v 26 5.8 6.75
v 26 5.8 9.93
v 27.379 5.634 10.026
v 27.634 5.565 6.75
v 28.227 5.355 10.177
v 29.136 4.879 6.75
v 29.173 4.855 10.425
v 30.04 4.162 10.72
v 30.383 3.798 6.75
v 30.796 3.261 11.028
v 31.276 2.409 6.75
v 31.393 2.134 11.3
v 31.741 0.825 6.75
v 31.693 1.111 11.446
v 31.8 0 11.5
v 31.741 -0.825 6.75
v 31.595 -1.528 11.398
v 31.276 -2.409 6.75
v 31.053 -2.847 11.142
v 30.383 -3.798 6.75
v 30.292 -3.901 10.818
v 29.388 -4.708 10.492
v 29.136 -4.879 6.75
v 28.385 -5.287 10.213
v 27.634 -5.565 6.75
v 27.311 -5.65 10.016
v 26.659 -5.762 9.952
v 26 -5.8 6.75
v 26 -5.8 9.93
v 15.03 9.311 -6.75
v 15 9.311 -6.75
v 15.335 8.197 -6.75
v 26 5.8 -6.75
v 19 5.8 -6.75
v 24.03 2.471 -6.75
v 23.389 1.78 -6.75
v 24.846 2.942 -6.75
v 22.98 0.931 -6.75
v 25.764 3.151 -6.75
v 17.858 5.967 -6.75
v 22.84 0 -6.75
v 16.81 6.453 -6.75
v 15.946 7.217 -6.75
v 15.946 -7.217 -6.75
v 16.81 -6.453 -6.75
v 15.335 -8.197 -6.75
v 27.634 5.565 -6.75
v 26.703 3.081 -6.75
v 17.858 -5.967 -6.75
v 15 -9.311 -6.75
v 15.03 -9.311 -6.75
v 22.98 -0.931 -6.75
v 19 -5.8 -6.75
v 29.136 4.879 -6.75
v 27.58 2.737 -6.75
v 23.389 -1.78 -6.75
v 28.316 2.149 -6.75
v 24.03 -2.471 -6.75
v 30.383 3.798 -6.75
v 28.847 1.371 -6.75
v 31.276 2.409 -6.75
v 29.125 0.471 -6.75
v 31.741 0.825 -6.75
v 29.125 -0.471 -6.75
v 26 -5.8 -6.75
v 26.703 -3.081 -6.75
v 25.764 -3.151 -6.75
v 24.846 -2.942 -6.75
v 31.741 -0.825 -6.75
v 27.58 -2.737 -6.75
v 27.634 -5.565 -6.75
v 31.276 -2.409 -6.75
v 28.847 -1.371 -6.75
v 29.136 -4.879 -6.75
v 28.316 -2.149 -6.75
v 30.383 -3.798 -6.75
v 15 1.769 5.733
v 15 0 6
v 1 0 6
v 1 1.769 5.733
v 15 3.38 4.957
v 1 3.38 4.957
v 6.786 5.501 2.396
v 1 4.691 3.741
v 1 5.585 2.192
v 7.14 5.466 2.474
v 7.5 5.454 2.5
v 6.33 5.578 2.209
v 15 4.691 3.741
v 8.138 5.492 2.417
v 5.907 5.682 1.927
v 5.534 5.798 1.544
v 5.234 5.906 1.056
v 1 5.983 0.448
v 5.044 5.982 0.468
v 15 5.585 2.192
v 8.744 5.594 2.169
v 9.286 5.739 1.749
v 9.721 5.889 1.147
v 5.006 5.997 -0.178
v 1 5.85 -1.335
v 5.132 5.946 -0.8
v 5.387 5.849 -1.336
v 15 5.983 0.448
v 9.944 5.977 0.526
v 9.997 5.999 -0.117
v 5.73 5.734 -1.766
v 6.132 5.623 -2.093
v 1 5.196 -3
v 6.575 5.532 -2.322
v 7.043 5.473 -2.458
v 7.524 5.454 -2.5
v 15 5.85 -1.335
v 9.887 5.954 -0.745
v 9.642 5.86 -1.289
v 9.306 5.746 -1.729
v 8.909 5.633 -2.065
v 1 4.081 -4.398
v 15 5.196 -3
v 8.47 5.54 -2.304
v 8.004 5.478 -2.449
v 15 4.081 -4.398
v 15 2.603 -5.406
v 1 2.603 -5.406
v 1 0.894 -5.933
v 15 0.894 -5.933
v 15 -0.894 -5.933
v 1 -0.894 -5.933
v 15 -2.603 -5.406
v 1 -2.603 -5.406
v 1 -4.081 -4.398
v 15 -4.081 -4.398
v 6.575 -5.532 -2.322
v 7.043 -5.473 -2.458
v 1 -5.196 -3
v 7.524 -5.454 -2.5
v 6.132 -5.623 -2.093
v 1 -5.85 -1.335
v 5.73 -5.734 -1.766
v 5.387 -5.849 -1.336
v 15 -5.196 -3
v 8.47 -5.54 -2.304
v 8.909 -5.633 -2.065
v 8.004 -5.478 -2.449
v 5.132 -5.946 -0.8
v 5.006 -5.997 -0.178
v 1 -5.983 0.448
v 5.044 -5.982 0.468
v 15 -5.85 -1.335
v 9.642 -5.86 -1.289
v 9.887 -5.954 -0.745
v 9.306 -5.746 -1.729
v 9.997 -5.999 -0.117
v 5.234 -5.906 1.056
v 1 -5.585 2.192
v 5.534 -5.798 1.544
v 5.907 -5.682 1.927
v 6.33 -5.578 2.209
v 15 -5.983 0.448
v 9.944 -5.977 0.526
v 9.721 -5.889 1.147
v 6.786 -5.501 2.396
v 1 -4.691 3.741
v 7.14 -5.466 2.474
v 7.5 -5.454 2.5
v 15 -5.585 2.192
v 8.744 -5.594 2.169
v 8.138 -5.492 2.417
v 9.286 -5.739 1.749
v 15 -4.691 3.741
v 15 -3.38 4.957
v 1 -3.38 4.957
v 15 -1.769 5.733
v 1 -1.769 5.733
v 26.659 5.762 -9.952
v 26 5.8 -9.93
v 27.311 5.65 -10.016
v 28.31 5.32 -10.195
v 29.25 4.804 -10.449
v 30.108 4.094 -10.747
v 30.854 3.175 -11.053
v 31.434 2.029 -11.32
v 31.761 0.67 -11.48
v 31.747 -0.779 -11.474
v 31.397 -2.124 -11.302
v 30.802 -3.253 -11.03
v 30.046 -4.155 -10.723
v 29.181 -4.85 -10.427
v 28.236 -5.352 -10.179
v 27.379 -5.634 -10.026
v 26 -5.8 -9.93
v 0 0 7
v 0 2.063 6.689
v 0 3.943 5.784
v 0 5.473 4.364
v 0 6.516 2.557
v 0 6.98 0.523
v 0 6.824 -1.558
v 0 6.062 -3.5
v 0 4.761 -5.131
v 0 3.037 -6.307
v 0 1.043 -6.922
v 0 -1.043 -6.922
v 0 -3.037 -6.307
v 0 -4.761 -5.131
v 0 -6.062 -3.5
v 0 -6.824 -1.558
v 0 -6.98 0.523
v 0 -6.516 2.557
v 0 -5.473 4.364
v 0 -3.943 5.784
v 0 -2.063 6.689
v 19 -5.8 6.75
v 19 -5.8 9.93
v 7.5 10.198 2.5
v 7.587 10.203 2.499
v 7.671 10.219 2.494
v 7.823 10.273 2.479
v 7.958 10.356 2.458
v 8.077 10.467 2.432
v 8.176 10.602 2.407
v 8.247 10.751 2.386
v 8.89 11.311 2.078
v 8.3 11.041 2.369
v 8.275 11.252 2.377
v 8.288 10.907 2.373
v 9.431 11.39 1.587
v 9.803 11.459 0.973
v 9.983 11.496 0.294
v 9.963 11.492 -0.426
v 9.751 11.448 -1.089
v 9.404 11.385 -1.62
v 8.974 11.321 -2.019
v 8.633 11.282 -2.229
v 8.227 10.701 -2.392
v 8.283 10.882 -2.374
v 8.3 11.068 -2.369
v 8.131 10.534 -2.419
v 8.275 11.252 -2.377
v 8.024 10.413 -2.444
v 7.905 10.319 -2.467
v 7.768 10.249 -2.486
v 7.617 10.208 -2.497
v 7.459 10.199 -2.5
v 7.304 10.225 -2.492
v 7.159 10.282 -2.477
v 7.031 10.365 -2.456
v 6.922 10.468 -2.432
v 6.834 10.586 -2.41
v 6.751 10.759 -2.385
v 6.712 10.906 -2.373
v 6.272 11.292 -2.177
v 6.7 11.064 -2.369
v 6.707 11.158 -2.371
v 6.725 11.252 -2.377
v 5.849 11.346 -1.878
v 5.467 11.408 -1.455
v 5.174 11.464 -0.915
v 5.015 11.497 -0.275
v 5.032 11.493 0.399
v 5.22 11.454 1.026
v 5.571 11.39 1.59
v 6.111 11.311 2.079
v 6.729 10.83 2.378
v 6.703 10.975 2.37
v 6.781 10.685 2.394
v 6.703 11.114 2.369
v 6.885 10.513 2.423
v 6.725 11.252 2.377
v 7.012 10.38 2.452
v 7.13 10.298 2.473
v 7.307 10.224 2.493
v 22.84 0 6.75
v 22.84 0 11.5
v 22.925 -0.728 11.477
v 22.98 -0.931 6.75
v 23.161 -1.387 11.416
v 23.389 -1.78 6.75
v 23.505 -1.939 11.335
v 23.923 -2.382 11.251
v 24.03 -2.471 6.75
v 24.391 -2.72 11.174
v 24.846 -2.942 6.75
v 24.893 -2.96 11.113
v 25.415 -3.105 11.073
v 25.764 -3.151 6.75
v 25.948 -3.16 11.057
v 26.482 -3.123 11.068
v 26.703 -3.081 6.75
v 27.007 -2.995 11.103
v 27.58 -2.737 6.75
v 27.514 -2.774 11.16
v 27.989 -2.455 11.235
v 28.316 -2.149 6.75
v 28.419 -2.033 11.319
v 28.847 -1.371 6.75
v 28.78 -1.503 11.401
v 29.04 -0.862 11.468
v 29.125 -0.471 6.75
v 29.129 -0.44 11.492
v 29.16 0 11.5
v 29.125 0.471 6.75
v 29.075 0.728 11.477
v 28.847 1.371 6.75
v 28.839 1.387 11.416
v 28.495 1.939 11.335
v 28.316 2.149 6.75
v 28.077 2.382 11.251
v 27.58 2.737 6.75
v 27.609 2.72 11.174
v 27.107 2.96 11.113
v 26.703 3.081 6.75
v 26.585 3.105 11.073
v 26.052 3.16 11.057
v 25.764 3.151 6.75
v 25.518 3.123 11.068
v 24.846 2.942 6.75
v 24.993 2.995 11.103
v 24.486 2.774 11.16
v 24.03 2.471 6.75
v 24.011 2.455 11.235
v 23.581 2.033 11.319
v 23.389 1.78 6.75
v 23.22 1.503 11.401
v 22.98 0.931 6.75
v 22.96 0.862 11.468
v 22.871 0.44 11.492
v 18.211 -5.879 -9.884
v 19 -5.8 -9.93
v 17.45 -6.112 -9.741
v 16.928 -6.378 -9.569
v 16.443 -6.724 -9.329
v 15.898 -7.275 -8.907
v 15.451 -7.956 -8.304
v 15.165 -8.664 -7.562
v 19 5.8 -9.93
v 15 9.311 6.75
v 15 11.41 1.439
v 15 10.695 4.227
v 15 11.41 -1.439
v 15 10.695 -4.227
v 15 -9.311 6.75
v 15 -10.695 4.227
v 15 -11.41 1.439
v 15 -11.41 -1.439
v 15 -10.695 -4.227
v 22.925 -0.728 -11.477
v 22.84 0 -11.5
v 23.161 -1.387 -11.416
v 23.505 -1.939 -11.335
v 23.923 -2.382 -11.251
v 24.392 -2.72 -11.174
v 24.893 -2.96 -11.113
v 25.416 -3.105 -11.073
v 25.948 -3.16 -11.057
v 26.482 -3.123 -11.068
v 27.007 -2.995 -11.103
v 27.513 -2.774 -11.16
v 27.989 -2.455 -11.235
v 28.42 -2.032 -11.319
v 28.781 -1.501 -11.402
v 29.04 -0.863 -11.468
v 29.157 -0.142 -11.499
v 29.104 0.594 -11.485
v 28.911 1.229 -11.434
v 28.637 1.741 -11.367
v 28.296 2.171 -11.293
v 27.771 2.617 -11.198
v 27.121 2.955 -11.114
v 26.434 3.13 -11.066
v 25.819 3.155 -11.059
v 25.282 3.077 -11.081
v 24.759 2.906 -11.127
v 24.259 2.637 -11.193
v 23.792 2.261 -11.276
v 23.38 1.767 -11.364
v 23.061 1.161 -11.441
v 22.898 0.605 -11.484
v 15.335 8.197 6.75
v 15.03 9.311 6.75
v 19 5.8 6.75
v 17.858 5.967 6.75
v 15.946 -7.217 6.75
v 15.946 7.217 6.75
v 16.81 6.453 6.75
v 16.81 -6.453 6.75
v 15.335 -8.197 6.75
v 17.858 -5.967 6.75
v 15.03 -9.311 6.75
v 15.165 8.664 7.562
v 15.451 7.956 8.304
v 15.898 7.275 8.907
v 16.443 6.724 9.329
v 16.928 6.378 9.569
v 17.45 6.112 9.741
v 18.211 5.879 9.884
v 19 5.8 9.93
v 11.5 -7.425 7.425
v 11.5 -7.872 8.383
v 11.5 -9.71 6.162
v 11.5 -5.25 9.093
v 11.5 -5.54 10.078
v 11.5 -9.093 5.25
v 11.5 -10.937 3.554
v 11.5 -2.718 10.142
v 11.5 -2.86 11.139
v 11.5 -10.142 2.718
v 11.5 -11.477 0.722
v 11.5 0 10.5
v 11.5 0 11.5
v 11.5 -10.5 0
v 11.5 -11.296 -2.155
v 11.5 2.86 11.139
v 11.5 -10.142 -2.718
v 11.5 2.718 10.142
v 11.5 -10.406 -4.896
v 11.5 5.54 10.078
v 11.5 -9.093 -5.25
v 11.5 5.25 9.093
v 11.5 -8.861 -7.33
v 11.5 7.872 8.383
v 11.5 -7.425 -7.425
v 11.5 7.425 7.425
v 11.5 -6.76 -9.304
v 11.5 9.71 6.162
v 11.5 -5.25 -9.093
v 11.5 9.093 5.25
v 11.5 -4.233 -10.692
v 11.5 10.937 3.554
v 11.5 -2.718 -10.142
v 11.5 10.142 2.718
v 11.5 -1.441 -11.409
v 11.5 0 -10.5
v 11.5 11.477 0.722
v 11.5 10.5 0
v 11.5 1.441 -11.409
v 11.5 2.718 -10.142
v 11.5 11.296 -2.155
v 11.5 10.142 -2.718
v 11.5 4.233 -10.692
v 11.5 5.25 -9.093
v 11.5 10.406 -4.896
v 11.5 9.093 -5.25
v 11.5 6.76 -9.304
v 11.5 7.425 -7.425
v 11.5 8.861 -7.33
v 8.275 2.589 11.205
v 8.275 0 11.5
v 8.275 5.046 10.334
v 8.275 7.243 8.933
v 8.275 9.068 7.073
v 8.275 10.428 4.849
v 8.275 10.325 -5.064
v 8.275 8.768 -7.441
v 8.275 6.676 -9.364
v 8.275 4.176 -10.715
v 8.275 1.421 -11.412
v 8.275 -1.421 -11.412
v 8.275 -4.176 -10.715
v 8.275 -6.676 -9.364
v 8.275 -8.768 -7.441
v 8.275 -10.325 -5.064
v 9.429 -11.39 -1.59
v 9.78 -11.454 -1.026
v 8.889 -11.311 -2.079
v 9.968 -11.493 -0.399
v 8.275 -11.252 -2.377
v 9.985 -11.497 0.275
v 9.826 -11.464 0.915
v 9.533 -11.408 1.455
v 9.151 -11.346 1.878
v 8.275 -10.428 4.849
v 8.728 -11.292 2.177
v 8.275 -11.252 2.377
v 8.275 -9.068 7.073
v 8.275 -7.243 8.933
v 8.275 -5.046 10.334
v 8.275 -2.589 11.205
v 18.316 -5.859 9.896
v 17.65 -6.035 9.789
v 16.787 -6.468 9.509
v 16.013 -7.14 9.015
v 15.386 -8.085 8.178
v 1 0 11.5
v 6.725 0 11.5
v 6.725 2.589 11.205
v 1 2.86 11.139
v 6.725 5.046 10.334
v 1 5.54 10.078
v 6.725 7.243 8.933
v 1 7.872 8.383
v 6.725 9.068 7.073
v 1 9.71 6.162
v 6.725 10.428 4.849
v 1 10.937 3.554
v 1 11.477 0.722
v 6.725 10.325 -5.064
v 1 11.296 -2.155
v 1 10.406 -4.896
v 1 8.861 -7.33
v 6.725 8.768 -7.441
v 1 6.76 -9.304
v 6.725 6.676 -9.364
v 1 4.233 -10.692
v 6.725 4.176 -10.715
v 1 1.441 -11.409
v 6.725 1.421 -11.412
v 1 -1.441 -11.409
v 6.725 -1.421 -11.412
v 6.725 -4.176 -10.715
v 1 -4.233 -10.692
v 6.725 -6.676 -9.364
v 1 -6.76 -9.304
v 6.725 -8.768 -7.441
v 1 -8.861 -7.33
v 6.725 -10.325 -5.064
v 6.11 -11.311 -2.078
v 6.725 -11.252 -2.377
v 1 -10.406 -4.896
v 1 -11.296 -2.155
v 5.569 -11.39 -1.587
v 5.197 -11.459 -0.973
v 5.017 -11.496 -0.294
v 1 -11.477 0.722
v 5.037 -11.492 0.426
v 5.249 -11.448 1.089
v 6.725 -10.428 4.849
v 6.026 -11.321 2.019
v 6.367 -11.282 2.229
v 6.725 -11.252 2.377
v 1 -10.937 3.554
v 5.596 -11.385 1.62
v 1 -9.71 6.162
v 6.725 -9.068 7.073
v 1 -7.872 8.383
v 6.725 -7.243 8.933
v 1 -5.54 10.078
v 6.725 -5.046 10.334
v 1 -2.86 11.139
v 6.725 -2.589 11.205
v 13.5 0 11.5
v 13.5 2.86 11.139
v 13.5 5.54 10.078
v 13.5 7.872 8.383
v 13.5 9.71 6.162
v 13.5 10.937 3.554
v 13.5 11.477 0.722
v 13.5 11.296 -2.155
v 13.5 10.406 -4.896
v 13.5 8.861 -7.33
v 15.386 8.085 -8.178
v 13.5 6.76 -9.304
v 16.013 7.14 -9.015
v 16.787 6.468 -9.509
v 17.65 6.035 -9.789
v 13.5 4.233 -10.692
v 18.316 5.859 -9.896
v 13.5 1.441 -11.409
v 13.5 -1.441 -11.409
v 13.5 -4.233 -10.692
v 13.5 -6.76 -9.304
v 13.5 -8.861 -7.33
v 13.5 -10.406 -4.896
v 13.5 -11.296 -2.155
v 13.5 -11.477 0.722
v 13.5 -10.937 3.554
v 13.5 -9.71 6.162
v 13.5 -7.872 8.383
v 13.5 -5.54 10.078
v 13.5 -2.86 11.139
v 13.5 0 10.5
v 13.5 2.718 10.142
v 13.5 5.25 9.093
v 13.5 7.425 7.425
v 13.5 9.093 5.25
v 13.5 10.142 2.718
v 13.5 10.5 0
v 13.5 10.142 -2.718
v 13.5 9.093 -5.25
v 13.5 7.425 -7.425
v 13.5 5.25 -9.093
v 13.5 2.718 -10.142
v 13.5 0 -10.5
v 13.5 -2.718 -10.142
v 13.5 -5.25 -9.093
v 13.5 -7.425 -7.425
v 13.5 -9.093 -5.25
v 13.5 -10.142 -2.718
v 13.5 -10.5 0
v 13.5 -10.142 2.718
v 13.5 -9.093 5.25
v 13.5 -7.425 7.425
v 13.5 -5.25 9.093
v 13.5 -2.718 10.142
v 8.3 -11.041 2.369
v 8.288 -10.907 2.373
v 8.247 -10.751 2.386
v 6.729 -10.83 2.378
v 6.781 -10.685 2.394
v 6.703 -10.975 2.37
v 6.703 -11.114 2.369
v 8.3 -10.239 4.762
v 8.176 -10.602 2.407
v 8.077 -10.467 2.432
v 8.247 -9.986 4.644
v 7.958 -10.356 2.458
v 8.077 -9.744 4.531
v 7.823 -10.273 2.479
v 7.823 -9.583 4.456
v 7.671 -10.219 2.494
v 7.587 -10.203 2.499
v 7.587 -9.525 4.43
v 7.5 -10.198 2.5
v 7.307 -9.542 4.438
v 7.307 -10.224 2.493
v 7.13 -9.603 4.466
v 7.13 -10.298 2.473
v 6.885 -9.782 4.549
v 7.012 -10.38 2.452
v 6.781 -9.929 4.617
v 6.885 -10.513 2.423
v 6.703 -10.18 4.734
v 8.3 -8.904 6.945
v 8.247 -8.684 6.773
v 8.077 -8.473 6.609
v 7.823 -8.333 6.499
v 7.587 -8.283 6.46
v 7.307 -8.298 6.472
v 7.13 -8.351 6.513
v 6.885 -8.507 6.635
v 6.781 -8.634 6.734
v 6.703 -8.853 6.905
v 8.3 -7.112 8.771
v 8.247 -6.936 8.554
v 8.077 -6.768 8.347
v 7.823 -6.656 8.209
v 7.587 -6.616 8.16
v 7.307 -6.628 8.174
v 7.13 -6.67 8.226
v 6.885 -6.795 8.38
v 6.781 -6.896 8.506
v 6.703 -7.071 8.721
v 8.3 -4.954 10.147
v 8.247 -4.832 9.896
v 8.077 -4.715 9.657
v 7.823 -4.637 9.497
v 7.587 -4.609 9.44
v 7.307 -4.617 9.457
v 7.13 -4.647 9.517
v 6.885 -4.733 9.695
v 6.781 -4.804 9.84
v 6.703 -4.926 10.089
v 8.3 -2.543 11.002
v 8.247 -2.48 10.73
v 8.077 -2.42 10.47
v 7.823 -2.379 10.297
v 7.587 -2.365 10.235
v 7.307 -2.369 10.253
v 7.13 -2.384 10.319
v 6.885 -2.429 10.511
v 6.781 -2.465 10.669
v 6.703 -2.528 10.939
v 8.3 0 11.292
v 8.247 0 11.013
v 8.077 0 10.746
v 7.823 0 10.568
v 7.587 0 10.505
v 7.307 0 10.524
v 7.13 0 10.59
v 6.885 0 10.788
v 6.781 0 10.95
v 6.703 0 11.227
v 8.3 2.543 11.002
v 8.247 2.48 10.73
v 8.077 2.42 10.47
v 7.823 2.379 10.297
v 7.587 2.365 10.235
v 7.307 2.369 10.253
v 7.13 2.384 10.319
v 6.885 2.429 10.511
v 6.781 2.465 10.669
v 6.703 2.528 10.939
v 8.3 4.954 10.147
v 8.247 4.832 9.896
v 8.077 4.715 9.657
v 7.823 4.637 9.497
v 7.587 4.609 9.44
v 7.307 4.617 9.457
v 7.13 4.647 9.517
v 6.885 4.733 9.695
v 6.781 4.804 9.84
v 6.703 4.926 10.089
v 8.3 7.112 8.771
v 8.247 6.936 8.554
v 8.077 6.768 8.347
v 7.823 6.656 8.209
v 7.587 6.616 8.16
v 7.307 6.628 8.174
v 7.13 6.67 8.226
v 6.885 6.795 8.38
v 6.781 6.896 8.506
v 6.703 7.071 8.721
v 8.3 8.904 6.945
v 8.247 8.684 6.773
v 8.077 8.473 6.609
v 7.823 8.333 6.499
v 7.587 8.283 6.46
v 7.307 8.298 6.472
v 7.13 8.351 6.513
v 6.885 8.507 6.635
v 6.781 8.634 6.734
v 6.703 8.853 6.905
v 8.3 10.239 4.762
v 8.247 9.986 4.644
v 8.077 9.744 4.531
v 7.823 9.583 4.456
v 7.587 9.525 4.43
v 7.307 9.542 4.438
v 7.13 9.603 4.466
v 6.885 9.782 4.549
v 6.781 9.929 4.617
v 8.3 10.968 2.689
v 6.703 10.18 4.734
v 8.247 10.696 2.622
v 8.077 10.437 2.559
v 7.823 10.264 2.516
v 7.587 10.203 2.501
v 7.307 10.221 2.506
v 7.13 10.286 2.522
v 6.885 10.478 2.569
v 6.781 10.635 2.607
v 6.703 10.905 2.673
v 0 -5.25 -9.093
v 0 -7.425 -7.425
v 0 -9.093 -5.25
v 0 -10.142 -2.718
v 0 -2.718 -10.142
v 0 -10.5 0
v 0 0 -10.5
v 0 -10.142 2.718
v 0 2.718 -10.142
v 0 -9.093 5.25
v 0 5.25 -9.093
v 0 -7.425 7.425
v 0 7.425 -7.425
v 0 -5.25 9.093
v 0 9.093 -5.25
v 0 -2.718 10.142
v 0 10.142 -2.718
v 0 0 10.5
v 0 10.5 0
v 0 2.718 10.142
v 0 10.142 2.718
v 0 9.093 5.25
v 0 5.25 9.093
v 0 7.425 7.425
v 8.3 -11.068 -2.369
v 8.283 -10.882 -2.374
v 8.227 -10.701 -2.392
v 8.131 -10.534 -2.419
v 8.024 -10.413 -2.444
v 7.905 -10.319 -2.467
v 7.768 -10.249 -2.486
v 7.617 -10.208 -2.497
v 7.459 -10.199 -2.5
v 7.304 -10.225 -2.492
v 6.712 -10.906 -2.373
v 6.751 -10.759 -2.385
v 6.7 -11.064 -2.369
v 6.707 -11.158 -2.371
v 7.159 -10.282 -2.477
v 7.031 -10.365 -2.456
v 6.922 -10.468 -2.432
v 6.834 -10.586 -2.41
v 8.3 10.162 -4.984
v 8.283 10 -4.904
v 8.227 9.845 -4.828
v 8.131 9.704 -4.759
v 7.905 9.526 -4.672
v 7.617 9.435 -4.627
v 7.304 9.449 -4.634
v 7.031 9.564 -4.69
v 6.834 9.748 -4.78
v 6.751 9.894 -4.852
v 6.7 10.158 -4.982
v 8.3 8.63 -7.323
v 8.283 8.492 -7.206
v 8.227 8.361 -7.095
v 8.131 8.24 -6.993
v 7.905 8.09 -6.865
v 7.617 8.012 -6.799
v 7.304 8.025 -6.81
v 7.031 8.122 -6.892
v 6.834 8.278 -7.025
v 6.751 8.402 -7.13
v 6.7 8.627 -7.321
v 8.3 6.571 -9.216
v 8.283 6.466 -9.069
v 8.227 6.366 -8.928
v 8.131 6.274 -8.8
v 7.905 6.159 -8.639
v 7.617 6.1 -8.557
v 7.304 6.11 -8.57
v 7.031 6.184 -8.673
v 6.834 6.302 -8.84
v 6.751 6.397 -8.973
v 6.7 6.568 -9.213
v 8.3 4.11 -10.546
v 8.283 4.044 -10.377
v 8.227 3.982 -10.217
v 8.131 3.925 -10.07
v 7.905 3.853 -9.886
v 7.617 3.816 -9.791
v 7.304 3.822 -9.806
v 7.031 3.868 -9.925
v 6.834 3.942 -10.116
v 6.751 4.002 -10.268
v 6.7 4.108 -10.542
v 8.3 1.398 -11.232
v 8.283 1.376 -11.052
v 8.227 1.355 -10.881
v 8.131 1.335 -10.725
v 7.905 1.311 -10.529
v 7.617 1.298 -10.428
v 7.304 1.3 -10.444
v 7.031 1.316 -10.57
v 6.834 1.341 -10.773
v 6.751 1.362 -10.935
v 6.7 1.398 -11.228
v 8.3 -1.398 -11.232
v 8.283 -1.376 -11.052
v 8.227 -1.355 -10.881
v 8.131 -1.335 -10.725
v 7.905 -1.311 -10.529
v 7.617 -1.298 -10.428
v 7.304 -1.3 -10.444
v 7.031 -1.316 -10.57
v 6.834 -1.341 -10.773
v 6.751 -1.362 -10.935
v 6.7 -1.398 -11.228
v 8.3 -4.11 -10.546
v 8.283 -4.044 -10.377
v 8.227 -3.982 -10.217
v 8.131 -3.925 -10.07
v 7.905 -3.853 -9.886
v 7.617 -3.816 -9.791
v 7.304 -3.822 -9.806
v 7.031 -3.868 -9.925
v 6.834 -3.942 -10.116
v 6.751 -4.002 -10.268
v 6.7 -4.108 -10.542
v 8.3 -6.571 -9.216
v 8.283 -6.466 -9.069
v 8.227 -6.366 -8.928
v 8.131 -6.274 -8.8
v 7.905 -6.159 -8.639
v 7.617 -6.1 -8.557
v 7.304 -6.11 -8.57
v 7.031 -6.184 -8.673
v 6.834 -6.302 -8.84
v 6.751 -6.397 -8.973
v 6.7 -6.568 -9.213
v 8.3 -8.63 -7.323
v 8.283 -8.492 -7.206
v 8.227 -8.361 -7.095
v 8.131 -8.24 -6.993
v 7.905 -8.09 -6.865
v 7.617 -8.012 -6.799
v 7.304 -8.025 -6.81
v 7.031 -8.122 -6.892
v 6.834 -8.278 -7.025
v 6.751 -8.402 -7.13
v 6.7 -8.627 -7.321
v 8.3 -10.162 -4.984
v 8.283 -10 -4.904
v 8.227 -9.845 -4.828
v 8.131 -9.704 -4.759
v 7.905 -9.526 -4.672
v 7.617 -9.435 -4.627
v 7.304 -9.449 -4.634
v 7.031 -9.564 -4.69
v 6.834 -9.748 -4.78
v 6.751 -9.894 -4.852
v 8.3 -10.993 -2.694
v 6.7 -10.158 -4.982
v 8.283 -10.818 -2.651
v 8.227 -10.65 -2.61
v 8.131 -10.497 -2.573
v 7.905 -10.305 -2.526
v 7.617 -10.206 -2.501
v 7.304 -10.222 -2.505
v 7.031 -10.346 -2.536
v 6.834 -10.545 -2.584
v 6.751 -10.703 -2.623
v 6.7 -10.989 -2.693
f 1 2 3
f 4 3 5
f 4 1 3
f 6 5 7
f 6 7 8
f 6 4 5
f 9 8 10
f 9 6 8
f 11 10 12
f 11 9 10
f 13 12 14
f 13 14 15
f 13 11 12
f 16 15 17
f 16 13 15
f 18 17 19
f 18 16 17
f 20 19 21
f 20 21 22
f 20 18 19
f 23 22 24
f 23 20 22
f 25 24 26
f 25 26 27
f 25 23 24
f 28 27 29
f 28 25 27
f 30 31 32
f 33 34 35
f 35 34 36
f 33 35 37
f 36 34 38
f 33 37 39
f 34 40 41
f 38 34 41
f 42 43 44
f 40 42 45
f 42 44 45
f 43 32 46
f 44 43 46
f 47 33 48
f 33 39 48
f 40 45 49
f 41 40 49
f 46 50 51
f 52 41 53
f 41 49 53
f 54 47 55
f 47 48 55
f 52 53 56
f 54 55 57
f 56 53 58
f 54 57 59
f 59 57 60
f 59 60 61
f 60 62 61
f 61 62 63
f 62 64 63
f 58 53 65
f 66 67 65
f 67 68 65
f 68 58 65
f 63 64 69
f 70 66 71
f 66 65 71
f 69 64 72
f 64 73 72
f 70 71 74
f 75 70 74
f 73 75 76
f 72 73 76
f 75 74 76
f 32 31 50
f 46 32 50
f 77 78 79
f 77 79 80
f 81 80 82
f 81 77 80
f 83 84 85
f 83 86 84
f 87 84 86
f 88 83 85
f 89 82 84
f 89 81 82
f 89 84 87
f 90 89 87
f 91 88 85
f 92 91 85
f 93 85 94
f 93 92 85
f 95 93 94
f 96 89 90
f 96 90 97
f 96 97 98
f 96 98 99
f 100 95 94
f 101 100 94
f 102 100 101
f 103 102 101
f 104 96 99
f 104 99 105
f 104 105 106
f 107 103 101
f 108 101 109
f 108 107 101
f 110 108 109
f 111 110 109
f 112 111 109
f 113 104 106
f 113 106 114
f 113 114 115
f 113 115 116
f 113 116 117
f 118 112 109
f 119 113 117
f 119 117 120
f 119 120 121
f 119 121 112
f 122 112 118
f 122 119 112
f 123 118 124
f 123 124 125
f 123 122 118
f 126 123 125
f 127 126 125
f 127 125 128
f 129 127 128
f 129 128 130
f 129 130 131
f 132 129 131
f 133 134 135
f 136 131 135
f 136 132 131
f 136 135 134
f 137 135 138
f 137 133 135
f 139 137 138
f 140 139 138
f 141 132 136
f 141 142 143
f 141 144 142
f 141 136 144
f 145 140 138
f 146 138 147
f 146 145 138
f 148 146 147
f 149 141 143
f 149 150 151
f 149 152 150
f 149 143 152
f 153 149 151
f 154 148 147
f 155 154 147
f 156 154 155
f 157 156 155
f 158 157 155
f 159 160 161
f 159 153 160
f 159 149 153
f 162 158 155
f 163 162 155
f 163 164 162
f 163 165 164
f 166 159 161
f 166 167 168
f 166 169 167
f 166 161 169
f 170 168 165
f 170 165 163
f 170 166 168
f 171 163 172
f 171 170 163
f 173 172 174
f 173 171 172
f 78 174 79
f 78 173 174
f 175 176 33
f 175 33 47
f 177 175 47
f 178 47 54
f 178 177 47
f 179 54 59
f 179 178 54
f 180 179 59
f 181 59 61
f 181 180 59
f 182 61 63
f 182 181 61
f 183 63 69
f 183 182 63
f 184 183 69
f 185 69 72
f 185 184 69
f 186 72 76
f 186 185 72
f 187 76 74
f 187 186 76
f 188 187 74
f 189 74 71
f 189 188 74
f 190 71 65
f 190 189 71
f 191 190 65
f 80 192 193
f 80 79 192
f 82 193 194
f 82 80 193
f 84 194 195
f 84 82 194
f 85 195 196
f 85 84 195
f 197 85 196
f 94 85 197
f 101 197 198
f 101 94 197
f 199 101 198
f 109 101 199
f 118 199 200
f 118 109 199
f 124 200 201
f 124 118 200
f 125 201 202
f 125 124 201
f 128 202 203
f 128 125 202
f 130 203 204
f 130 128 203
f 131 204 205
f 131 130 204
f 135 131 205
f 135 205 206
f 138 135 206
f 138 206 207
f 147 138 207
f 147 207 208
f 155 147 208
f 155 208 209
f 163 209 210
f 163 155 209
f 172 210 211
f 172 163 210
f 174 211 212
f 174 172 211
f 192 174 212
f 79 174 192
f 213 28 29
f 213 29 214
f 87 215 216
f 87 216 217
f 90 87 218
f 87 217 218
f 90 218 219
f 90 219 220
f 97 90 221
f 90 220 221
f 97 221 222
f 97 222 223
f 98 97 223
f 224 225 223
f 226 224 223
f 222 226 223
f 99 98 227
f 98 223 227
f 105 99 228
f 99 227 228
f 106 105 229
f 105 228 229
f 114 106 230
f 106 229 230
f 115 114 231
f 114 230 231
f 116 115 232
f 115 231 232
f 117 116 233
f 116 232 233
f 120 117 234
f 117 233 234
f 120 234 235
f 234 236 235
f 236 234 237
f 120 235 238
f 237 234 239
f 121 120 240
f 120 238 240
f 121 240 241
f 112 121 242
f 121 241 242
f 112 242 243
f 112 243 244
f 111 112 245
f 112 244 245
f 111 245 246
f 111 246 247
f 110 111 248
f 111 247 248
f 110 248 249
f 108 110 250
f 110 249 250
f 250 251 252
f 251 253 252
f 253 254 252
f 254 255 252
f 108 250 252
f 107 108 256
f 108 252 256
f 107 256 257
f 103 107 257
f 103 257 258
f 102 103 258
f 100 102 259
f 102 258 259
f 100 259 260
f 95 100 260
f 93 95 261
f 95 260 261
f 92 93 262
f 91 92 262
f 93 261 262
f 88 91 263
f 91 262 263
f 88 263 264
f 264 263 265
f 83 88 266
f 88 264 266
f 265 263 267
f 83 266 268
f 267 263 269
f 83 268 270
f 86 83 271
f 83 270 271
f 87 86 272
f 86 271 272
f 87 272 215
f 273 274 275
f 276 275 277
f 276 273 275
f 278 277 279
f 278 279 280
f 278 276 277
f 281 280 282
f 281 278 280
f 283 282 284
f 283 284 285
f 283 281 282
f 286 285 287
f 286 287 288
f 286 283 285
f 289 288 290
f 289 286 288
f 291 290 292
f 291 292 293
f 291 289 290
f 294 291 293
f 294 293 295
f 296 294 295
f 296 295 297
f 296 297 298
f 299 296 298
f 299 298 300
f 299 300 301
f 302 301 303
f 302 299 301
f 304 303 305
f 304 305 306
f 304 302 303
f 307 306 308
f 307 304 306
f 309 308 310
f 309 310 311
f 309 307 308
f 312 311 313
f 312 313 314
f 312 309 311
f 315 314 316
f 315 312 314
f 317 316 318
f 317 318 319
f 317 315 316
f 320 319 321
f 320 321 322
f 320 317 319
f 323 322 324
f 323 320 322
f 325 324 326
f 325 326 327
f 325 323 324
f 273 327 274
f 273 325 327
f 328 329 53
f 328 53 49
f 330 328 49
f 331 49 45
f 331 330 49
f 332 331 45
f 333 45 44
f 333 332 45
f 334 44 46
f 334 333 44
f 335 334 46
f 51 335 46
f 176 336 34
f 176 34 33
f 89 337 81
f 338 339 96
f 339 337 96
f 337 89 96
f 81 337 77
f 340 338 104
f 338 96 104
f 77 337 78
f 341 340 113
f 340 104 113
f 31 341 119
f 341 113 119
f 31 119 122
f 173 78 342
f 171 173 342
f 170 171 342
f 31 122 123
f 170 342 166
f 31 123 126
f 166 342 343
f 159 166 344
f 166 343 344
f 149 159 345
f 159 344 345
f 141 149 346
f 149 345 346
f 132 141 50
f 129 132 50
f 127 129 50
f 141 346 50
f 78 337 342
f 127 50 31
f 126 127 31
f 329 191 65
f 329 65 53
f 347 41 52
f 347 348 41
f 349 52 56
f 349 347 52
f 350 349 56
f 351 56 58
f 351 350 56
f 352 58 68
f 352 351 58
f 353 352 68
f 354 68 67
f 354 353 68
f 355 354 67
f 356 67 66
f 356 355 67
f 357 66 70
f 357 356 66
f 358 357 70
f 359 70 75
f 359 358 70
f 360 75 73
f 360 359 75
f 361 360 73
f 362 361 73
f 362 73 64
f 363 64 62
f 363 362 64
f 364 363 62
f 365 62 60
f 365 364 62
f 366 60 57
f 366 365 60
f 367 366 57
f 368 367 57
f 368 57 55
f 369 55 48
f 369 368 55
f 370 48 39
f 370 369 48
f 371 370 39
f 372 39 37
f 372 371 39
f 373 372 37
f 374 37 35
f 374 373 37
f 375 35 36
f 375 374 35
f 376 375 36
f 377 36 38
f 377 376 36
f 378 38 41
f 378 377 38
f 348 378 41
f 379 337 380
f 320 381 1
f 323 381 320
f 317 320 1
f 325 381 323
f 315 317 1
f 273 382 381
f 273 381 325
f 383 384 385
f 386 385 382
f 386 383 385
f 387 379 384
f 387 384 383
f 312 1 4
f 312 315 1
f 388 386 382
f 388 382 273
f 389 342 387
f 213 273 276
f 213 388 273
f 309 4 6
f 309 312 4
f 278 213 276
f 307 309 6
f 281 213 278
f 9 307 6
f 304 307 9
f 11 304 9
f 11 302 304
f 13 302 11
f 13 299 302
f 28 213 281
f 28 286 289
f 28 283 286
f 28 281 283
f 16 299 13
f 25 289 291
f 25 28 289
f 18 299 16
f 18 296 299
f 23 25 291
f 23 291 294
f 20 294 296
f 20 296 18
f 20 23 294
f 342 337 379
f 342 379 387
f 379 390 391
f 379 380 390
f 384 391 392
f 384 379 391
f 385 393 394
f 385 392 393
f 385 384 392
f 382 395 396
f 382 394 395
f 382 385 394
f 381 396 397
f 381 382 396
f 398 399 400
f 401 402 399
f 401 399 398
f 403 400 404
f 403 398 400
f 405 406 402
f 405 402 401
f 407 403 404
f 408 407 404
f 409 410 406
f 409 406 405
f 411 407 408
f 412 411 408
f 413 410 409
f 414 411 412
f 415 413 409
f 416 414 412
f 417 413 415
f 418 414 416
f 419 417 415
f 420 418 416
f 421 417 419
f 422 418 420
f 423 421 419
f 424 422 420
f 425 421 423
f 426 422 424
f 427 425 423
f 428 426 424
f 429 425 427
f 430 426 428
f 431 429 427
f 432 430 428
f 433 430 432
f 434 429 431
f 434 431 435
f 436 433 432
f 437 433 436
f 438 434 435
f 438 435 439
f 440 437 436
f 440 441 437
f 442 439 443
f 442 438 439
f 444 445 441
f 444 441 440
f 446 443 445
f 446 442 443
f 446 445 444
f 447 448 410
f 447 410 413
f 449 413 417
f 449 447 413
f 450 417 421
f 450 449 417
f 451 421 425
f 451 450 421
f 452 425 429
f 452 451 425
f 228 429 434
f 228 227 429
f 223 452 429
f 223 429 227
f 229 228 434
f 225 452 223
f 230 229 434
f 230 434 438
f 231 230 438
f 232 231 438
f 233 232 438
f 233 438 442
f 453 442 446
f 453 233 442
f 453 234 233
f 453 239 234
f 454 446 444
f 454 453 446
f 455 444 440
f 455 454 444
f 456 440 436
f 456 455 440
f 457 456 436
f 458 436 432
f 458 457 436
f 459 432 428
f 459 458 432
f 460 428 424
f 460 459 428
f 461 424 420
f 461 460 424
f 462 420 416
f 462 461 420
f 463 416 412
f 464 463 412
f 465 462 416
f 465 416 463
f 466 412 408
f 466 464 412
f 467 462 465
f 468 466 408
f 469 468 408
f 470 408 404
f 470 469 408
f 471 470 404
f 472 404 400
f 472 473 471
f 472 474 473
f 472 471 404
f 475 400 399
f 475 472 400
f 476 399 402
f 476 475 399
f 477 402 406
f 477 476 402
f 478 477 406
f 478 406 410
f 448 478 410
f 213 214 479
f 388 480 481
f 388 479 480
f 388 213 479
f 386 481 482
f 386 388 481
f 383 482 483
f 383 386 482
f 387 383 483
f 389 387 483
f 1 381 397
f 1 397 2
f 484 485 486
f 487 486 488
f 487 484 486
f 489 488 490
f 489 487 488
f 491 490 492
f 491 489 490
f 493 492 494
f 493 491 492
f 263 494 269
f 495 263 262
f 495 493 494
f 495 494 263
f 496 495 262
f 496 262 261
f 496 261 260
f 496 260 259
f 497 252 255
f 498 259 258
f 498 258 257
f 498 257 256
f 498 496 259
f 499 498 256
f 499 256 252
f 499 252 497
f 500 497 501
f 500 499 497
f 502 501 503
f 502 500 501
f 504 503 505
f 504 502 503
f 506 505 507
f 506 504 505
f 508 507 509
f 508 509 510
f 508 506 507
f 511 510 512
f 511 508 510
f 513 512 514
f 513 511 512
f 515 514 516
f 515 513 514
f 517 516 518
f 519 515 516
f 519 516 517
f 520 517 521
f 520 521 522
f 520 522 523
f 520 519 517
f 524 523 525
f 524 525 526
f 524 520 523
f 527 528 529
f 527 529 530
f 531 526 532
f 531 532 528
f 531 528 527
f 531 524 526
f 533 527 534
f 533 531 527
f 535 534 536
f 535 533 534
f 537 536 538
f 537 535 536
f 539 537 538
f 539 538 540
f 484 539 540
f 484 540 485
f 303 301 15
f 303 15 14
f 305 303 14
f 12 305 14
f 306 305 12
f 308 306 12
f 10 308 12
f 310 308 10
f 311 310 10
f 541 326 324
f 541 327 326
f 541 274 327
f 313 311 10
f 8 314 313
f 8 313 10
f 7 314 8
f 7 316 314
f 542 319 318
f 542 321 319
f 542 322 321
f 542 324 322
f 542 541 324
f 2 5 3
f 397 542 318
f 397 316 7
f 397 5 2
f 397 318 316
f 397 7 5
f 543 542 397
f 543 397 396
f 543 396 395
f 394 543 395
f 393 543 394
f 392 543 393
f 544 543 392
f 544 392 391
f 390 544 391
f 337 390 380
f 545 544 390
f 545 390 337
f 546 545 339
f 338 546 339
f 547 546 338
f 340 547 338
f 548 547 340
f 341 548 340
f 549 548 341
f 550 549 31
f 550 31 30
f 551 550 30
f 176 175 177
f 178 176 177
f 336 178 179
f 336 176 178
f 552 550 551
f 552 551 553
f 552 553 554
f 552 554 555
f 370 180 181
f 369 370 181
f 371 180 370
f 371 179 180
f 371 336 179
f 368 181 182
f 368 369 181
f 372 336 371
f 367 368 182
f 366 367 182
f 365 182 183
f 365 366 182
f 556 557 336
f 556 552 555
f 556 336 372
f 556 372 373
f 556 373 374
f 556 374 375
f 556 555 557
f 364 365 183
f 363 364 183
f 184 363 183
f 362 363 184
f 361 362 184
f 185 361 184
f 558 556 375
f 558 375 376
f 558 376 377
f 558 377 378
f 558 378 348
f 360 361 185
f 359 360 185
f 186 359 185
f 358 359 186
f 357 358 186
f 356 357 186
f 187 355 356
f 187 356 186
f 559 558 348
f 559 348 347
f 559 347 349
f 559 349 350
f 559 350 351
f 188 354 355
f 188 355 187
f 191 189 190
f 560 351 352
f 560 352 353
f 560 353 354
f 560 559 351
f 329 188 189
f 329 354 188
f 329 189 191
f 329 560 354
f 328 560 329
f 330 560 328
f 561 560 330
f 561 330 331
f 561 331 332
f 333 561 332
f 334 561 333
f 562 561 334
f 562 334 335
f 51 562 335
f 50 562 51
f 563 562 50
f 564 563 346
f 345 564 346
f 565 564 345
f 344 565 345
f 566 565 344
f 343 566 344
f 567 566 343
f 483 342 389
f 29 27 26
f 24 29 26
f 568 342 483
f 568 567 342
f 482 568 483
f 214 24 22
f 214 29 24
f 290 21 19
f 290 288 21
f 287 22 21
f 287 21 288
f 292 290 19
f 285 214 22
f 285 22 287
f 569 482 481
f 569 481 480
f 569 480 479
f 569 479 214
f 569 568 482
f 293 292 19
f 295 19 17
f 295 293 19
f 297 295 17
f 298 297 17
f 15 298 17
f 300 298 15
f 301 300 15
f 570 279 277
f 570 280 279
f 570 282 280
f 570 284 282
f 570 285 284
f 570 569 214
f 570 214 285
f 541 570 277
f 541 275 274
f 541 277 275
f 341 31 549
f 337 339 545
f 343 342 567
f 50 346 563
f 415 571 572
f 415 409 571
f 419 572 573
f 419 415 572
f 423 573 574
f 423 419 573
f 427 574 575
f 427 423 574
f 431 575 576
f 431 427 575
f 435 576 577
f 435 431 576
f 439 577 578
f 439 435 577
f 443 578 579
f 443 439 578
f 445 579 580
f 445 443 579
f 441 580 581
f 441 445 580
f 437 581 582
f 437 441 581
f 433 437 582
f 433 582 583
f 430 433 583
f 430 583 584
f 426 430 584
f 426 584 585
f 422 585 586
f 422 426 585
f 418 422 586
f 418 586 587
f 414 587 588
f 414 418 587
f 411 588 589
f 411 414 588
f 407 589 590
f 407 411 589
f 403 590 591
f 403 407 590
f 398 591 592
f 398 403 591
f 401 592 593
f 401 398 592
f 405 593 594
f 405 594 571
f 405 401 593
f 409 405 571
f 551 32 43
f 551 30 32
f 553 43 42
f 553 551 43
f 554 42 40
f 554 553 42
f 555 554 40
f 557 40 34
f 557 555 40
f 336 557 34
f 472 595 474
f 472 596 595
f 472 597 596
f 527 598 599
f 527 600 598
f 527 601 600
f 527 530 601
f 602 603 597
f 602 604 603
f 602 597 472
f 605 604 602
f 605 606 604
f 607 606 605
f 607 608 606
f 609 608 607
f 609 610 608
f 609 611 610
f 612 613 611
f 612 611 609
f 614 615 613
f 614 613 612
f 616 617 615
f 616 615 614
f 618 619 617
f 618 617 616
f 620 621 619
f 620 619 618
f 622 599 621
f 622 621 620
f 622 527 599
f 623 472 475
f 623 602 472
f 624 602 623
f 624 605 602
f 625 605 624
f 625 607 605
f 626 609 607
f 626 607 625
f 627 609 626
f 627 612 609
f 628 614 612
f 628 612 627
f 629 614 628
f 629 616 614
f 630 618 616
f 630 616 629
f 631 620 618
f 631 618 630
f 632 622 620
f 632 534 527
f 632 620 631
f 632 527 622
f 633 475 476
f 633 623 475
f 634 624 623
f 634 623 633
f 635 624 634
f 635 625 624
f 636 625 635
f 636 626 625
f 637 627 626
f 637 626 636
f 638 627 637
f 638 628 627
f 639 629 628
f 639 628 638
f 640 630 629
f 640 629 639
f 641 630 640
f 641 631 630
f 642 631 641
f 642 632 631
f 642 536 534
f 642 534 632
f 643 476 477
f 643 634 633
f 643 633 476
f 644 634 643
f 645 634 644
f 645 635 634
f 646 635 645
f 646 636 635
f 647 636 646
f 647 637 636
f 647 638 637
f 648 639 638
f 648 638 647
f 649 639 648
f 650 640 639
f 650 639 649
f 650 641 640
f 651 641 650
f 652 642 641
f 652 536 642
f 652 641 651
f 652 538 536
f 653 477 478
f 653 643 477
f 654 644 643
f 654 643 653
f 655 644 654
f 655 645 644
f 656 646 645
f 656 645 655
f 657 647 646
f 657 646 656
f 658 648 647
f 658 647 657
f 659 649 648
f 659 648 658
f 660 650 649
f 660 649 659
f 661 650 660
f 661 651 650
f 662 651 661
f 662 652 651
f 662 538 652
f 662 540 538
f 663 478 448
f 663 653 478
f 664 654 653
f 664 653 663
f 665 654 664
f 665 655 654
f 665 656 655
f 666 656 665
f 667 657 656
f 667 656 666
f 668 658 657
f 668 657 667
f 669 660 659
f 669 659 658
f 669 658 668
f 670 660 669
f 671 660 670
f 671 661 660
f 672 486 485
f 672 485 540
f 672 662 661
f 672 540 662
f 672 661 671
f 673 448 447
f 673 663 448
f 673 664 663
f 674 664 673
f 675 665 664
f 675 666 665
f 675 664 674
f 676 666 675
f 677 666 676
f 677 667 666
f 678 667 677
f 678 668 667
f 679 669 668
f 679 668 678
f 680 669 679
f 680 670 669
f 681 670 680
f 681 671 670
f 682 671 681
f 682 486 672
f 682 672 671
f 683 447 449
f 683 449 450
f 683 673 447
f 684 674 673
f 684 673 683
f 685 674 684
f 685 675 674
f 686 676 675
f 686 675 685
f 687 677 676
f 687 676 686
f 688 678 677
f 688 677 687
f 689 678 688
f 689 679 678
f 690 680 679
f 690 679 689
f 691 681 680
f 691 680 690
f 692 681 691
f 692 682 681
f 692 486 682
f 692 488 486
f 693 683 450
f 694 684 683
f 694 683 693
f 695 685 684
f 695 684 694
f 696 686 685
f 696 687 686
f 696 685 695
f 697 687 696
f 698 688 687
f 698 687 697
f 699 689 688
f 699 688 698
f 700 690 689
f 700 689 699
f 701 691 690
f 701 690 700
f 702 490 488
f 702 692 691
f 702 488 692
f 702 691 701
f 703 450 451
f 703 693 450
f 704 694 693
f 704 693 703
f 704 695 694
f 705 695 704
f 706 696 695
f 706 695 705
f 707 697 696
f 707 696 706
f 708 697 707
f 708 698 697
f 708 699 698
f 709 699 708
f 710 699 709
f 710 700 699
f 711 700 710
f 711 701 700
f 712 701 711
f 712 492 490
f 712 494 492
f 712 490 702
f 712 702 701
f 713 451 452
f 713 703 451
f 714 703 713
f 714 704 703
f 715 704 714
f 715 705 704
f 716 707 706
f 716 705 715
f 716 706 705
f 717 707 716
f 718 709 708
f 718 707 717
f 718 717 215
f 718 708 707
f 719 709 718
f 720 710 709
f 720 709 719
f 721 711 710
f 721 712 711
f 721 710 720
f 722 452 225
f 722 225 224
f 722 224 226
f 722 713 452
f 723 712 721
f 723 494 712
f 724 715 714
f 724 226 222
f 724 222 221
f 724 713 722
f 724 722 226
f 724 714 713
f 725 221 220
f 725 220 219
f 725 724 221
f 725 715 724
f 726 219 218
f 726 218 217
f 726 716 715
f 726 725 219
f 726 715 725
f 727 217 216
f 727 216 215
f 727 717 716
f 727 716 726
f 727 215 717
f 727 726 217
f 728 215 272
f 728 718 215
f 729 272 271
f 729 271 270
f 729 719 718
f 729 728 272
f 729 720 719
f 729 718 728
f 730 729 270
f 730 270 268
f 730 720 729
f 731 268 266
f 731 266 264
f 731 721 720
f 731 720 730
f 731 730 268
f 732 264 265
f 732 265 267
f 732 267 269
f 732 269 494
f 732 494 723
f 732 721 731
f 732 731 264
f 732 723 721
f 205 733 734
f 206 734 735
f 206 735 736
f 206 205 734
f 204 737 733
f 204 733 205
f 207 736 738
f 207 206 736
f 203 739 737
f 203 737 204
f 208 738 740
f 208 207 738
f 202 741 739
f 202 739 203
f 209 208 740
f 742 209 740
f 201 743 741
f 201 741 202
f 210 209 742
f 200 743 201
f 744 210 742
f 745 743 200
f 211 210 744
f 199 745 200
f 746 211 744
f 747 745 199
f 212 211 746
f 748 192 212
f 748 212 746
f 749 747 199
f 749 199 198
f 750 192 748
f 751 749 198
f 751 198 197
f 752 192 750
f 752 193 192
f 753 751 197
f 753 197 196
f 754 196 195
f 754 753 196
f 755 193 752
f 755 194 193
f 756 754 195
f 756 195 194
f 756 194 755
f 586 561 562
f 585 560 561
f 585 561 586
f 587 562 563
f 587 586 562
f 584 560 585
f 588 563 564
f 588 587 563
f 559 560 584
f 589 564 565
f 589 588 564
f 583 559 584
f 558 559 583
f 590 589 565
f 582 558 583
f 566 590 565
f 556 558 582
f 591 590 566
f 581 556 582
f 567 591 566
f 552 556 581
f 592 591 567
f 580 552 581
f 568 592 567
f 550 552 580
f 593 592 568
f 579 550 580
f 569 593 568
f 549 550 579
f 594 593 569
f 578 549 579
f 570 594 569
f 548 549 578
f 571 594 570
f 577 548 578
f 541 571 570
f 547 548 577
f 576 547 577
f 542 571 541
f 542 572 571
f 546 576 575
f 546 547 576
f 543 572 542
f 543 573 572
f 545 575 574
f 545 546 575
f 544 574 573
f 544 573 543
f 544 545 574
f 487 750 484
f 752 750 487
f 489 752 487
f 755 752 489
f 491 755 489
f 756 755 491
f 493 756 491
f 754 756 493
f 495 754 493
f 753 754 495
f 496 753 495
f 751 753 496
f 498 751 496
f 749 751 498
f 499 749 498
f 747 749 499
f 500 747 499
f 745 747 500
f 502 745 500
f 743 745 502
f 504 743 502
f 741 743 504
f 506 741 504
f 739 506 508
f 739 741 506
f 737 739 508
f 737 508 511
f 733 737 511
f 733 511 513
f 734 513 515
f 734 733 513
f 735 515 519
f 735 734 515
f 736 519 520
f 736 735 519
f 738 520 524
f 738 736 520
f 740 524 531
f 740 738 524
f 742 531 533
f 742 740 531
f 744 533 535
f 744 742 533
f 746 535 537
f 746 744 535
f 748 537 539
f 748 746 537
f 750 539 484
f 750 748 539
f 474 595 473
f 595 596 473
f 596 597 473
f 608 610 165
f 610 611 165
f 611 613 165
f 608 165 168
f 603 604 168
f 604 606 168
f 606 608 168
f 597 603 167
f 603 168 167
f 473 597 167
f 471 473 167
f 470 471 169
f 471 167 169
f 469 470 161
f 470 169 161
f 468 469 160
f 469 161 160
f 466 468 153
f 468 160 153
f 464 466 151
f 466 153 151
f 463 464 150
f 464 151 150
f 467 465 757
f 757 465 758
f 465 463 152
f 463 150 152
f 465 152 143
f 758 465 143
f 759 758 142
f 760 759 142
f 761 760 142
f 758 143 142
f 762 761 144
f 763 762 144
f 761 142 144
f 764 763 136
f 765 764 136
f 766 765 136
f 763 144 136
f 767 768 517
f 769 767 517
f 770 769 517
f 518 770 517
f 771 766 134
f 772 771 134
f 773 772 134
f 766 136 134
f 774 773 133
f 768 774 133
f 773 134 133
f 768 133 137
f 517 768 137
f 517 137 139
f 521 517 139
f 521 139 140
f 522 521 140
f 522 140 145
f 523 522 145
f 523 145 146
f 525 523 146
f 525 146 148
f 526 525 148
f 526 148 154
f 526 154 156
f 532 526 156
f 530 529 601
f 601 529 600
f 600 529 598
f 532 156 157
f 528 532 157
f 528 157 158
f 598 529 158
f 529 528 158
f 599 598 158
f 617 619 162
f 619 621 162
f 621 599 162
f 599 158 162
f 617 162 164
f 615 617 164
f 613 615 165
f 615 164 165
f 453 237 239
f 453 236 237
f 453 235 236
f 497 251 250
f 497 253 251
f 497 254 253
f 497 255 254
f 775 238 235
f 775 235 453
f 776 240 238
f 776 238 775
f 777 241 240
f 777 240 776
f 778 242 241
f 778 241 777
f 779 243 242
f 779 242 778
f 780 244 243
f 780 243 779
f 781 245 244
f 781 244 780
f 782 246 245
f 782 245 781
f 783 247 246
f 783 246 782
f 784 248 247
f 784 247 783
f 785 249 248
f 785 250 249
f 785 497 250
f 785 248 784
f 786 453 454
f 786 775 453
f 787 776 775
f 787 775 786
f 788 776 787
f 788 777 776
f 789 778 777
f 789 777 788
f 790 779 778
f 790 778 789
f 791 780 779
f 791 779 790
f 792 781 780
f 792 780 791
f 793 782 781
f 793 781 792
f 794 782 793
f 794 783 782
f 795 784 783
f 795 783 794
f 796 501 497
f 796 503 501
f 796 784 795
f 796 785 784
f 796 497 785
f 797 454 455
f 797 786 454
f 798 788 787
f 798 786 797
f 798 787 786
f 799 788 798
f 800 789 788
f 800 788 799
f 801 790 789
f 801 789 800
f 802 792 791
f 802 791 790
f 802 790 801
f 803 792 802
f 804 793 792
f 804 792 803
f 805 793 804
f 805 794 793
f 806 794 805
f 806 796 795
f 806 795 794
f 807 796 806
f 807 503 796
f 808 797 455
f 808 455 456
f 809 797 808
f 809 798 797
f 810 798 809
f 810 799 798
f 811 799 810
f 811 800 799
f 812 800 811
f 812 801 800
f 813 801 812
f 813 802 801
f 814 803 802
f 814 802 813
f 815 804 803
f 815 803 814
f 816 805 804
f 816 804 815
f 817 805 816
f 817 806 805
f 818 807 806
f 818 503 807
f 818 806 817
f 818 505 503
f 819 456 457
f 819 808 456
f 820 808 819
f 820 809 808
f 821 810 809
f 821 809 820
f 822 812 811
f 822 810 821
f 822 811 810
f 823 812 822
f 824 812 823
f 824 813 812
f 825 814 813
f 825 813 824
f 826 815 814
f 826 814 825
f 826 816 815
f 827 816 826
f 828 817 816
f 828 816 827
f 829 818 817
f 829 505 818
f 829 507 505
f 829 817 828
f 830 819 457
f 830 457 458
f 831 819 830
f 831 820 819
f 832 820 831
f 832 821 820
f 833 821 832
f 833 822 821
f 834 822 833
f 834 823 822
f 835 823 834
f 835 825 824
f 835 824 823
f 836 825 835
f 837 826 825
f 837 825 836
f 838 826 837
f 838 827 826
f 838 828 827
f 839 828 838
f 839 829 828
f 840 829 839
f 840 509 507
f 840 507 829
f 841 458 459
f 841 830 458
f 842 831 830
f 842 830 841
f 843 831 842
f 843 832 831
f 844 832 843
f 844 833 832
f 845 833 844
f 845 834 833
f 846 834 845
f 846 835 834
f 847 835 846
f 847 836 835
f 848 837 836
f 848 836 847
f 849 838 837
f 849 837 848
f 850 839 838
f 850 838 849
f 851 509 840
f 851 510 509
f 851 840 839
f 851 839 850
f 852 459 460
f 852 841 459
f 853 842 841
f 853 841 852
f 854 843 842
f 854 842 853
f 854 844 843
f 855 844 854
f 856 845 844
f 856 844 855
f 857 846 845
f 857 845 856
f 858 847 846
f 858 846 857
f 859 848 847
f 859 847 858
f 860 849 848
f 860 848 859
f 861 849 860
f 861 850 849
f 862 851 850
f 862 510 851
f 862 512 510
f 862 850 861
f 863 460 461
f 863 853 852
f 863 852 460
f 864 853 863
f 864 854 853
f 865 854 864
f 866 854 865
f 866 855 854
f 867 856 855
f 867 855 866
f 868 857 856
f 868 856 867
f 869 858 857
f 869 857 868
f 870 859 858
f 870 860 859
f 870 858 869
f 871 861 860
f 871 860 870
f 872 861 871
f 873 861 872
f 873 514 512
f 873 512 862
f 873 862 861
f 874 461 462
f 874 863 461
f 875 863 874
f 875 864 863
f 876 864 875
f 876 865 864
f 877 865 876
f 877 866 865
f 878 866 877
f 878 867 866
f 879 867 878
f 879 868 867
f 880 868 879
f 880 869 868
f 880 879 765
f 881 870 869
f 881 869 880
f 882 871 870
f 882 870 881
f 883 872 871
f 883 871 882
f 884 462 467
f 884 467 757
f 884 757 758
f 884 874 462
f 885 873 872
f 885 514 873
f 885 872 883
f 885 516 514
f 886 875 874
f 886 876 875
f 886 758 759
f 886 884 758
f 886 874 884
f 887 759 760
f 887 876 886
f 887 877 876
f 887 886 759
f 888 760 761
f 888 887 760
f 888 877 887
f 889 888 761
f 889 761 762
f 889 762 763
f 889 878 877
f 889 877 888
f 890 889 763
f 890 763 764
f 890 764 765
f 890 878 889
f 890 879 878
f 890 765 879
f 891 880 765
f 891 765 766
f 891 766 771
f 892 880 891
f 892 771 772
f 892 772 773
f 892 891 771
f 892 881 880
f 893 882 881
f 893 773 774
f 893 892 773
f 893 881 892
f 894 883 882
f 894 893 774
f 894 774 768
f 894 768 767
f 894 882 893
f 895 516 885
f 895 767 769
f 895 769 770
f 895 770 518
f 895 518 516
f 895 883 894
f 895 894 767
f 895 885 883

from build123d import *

# Parameters (mm, degrees)
CUT_EXTRUDE1_DEPTH      = 23
CUT_EXTRUDE1_DEPTH_BACK = 23
CUT_EXTRUDE2_DEPTH      = 23
CUT_EXTRUDE2_DEPTH_BACK = 23
SKETCH3_W               = 26
SKETCH3_H               = 13.5
SKETCH4_W               = 23
SKETCH4_H               = 3.16
SKETCH5_W               = 2.5
SKETCH5_H               = 23


with BuildPart() as part:
    # Sketch1 → Revolve1 (revolve)
    with BuildSketch(Plane.XY):
        with BuildLine():
            Line((0, 10.5), (0, 7))
            Line((0, 7), (1, 6))
            Line((1, 6), (31.8, 6))
            Line((31.8, 6), (31.8, 11.5))
            Line((31.8, 11.5), (13.5, 11.5))
            Line((13.5, 11.5), (13.5, 10.5))
            Line((13.5, 10.5), (11.5, 10.5))
            Line((11.5, 10.5), (11.5, 11.5))
            Line((11.5, 11.5), (8.274596669, 11.5))
            ThreePointArc((8.274596669, 11.5), (7.5, 10.5), (6.725403331, 11.5))
            Line((6.725403331, 11.5), (1, 11.5))
            Line((1, 11.5), (0, 10.5))
        make_face()
    revolve(axis=Axis((31.8, 0, 0), (-1, 0, 0)))

    # Sketch2 → Cut-Extrude1 (cut, two sides: drawn at the far end of the back side and taken through both)
    with BuildSketch(Plane.XY.offset(-CUT_EXTRUDE1_DEPTH_BACK)):
        with BuildLine():
            Line((15, 12.5), (15, 9.8))
            ThreePointArc((15, 9.8), (16.171572875, 6.971572875), (19, 5.8))
            Line((19, 5.8), (26, 5.8))
            ThreePointArc((26, 5.8), (31.8, 0), (26, -5.8))
            Line((26, -5.8), (19, -5.8))
            ThreePointArc((19, -5.8), (16.171572875, -6.971572875), (15, -9.8))
            Line((15, -9.8), (15, -12.5))
            Line((15, -12.5), (41, -12.5))
            Line((41, -12.5), (41, 12.5))
            Line((41, 12.5), (15, 12.5))
        make_face()
    extrude(amount=CUT_EXTRUDE1_DEPTH + CUT_EXTRUDE1_DEPTH_BACK, mode=Mode.SUBTRACT)

    # Sketch3 → Cut-Extrude2 (cut, two sides: drawn at the far end of the back side and taken through both)
    with BuildSketch(Plane(origin=(0, 0, 0), x_dir=(1, 0, 0), z_dir=(0, 1, 0)).offset(-CUT_EXTRUDE2_DEPTH_BACK)):
        with Locations((28, 0)):
            Rectangle(SKETCH3_W, SKETCH3_H)
    extrude(amount=CUT_EXTRUDE2_DEPTH + CUT_EXTRUDE2_DEPTH_BACK, mode=Mode.SUBTRACT)

    # Sketch4 → Cut-Revolve1 (revolve, cut)
    with BuildSketch(Plane(origin=(26, 0, 0), x_dir=(0, 0, -1), z_dir=(1, 0, 0))):
        with Locations((0, 1.58)):
            Rectangle(SKETCH4_W, SKETCH4_H)
    revolve(axis=Axis((26, 0, -11.5), (0, 0, 1)), mode=Mode.SUBTRACT)

    # Sketch5 → Cut-Revolve2 (revolve, cut)
    with BuildSketch(Plane(origin=(7.5, 0, 0), x_dir=(0, 0, -1), z_dir=(1, 0, 0))):
        with Locations((1.25, 0)):
            Rectangle(SKETCH5_W, SKETCH5_H)
    revolve(axis=Axis((7.5, -11.5, 0), (0, 1, 0)), mode=Mode.SUBTRACT)


solid = part.part
